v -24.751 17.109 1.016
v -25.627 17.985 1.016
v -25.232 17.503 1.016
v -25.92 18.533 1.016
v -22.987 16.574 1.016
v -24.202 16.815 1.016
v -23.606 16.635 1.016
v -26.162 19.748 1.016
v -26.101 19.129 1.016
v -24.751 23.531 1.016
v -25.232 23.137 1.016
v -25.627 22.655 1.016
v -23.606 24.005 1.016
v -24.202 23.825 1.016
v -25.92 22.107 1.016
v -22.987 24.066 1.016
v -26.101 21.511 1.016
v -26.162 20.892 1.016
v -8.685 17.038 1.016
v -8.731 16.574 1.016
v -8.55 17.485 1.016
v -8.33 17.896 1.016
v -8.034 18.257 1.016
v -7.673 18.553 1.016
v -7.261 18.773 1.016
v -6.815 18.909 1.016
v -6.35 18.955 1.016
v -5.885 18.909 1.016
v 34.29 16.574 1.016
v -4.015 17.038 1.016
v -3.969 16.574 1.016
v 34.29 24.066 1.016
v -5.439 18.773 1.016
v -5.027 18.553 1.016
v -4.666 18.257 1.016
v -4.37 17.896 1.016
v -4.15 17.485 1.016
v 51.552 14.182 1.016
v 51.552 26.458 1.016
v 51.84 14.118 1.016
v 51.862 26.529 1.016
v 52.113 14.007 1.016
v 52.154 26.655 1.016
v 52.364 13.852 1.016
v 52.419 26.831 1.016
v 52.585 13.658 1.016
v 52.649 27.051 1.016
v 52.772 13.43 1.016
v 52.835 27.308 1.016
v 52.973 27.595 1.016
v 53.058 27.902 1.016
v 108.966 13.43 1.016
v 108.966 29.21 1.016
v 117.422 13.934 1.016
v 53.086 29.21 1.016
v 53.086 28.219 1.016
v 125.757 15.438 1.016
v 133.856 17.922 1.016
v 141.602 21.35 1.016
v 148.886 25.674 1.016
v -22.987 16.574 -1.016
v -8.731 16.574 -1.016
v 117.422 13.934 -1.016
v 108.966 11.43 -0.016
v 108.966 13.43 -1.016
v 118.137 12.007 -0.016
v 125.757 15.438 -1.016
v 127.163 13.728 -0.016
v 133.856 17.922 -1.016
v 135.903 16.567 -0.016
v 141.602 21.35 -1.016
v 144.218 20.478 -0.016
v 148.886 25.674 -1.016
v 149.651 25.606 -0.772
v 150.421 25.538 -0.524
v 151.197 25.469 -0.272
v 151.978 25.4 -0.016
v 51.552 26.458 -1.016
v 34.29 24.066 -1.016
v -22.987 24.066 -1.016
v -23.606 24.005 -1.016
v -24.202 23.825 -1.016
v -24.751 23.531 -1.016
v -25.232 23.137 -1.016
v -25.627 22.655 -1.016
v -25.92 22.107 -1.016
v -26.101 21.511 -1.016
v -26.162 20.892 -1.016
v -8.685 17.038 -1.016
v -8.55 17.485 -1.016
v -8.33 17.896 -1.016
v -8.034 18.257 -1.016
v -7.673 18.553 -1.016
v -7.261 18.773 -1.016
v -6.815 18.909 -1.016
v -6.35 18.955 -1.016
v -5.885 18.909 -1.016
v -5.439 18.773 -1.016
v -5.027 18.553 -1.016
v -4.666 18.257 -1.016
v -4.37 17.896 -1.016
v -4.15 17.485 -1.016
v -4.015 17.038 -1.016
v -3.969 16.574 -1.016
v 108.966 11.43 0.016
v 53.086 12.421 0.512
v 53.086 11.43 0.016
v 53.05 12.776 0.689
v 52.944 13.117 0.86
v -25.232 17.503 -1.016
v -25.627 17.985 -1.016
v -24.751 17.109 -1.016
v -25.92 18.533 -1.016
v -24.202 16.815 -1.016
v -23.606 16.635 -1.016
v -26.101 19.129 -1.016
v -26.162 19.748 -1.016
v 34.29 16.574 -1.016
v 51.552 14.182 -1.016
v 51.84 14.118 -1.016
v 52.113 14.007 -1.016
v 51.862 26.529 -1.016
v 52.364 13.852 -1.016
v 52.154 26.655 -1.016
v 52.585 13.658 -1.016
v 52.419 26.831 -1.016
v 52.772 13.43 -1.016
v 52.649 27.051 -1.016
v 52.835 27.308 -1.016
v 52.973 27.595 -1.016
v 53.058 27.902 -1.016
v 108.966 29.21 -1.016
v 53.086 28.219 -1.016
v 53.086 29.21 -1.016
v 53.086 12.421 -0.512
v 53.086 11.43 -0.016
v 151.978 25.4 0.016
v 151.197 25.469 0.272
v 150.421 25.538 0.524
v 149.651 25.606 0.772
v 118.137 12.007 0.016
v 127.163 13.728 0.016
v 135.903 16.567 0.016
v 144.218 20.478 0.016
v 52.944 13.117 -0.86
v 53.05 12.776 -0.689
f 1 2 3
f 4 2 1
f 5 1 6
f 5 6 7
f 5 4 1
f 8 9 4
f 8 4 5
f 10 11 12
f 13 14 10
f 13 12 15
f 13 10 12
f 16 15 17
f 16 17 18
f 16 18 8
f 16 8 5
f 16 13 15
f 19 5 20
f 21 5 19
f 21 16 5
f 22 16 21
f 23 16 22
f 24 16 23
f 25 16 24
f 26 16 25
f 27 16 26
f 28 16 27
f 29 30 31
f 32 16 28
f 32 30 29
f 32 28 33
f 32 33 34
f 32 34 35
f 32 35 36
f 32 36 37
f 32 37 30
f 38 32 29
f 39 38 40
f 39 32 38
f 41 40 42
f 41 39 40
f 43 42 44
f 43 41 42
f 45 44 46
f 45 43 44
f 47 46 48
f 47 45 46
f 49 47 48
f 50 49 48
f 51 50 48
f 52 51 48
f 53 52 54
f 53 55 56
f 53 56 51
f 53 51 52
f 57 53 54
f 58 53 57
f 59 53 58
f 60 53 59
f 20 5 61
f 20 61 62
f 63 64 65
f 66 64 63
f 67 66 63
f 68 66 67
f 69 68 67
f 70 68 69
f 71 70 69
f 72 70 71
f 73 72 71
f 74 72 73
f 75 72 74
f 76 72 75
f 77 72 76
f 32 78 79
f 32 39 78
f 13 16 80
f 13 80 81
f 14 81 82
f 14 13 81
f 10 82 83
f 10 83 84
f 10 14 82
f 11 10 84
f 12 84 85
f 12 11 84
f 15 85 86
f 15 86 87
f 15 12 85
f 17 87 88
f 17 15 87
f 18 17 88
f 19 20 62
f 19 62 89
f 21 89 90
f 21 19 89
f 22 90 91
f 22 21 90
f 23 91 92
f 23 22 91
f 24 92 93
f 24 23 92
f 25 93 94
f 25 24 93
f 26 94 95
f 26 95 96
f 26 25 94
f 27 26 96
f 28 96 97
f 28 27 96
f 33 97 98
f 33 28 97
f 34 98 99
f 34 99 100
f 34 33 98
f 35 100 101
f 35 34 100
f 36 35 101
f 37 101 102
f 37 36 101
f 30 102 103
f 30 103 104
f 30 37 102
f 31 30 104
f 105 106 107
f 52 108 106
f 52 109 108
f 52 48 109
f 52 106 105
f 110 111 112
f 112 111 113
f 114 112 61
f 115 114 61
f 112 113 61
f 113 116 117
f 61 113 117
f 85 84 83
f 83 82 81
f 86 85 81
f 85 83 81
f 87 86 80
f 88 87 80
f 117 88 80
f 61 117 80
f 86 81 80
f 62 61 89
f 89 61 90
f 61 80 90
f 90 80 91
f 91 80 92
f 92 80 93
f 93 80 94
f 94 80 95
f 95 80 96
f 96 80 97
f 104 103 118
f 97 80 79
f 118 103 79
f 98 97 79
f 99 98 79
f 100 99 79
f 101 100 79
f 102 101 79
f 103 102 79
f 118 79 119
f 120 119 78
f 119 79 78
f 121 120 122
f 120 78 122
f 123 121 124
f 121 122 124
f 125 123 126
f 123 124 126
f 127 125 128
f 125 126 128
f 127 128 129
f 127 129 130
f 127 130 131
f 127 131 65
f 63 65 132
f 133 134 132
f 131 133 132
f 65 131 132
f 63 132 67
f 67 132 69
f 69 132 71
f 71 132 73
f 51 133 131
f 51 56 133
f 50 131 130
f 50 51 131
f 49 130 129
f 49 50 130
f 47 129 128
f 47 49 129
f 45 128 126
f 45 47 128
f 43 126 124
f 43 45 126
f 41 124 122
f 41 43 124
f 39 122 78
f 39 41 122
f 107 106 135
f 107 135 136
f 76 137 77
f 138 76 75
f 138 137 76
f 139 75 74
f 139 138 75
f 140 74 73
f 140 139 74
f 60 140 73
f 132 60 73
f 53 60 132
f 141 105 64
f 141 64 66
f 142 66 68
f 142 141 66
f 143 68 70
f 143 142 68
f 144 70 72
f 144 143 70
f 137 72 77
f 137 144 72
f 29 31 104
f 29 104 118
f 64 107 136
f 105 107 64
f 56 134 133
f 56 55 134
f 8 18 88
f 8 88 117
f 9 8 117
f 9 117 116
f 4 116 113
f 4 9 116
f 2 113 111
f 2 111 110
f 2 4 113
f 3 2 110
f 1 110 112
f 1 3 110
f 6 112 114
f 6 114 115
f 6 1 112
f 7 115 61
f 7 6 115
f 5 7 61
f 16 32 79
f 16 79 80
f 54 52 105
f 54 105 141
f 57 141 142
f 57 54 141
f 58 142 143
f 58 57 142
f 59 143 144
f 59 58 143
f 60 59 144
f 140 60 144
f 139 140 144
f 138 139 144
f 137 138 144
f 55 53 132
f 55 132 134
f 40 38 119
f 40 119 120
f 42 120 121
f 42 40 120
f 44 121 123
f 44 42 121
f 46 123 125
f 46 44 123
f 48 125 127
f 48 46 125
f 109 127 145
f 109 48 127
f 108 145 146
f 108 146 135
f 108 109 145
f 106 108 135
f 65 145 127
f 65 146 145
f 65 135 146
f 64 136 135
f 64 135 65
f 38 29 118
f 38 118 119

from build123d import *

# Parameters (mm, degrees)
F1_DEPTH = 1.016
F2_SIZE2 = 2
F2_SIZE  = 1
F3_SIZE2 = 1
F3_SIZE  = 2


with BuildPart() as f1:
    # F0 (on Top) → F1 (new body, symmetric)
    with BuildSketch(Plane.XY):
        with BuildLine():
            Line((51.551948, 26.457513), (34.29, 24.0665))
            Line((34.29, 24.0665), (-22.987, 24.0665))
            ThreePointArc((-22.987, 24.0665), (-25.232064, 23.136564), (-26.162, 20.8915))
            Line((-26.162, 20.8915), (-26.162, 19.7485))
            ThreePointArc((-26.162, 19.7485), (-25.232064, 17.503436), (-22.987, 16.5735))
            Line((-22.987, 16.5735), (-8.73125, 16.5735))
            ThreePointArc((-8.73125, 16.5735), (-6.35, 18.95475), (-3.96875, 16.5735))
            Line((-3.96875, 16.5735), (34.29, 16.5735))
            Line((34.29, 16.5735), (51.551948, 14.182487))
            ThreePointArc((51.551948, 14.182487), (52.648713, 13.589108), (53.086, 12.421302))
            Line((53.086, 12.421302), (53.086, 11.43))
            Line((53.086, 11.43), (59.436, 11.43))
            Line((59.436, 11.43), (108.966, 11.43))
            ThreePointArc((108.966, 11.43), (131.577707, 15.010048), (151.977583, 25.4))
            Line((151.977583, 25.4), (108.966, 29.21))
            Line((108.966, 29.21), (59.436, 29.21))
            Line((59.436, 29.21), (53.086, 29.21))
            Line((53.086, 29.21), (53.086, 28.218698))
            ThreePointArc((53.086, 28.218698), (52.648713, 27.050892), (51.551948, 26.457513))
        make_face()
    extrude(amount=F1_DEPTH, both=True)

    # F2
    f2_edges = [f1.edges().sort_by_distance(p)[0] for p in [
        (81.026, 11.43, 1.016),
    ]]
    chamfer(f2_edges, length=F2_SIZE, length2=F2_SIZE2)

    # F3
    f3_edges = [f1.edges().sort_by_distance(p)[0] for p in [
        (81.026, 11.43, -1.016),
    ]]
    chamfer(f3_edges, length=F3_SIZE, length2=F3_SIZE2)


solid = f1.part
